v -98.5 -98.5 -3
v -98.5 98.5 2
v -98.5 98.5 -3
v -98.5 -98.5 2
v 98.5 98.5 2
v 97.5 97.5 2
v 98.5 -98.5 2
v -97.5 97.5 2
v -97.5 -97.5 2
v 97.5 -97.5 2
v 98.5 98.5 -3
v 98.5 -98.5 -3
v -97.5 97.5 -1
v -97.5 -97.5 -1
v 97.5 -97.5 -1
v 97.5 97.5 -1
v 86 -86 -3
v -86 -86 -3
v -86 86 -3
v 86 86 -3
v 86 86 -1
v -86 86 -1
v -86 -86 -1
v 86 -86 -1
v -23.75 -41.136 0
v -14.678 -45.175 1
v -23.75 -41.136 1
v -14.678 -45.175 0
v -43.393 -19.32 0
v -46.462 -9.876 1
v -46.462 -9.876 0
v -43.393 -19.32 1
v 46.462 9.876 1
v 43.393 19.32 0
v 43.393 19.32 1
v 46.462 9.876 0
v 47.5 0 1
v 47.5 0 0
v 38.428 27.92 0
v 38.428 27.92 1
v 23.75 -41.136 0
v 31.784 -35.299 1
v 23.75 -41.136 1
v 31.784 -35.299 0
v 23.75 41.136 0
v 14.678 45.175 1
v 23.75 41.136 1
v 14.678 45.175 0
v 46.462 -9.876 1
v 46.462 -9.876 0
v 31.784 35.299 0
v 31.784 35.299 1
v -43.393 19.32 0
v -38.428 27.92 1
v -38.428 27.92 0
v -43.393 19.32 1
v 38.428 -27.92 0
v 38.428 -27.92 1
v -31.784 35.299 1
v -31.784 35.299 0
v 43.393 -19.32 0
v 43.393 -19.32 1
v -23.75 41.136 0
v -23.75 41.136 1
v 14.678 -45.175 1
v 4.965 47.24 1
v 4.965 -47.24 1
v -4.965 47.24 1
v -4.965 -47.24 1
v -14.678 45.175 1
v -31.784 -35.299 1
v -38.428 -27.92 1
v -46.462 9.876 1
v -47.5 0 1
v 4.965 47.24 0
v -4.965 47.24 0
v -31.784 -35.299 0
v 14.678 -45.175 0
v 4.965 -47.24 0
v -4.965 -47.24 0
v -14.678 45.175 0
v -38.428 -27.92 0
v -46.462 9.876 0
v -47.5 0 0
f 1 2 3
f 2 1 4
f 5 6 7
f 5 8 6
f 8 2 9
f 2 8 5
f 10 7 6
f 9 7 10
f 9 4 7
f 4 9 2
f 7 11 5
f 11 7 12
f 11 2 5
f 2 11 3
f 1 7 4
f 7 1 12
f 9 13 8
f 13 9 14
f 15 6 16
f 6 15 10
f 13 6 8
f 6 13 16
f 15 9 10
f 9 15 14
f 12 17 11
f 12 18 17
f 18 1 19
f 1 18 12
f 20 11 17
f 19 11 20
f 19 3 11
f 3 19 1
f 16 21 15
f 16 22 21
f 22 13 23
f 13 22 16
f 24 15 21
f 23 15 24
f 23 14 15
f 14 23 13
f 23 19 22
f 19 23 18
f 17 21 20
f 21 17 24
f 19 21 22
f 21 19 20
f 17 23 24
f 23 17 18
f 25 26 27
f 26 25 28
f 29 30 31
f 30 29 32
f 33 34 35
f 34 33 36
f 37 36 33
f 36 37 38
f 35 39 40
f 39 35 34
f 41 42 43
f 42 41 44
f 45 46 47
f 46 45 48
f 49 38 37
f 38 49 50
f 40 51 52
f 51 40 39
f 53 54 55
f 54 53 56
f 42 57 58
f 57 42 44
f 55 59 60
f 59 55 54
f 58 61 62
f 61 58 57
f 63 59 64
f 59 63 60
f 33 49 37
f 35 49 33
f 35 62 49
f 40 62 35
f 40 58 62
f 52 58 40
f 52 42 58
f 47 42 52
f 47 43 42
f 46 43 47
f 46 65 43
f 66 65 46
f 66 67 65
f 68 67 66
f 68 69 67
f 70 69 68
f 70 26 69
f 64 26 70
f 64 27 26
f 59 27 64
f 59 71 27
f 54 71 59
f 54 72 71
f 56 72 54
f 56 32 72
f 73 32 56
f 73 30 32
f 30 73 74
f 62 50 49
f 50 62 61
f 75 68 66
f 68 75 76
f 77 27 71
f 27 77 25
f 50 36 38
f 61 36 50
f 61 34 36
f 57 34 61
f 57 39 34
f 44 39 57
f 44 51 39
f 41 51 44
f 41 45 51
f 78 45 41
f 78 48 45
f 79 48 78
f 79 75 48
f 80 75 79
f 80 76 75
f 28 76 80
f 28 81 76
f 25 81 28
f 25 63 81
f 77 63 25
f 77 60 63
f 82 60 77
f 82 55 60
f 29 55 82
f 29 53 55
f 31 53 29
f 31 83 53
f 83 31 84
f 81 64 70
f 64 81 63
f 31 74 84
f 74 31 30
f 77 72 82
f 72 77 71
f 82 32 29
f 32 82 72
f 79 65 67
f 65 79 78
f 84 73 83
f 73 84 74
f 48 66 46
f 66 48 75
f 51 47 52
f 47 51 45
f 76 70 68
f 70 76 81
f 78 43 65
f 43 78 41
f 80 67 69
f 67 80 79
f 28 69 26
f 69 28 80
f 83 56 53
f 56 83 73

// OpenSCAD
BoxTopLength=197;
BoxTopWidth=197;
LipHeight=4;
LipThickness=2;
LipOverHangWidth=25;
BoxTopThickness=2;
IsOpenTop=true;


//meshX=26;
meshY=18;
meshZ=40;
Seedrows=4;
Seedcolumns=4;

spokeCount=24;
spokerows=8;
spokeDia=15;
spokeY=2;
wallWidth=2;

//module lip(x,y,wall, height)
//{
//     translate([x/2,y/2,height/2]) difference()
//    {
//    cube([x,y,height],true);
//    cube([x-wall,y-wall,height+1], true);
//    }
//}

//module overlap(x,y,thickness, base)
module overlap(boxTopLength, boxTopWidth, boxTopThickness, lipHeight, lipThickness)
{
    echo(boxTop=4,boxTopLength=boxTopLength, boxTopWidth=boxTopWidth, boxTopThickness=boxTopThickness, lipHeight=lipHeight, lipThickness=lipThickness);
    
    height=boxTopThickness;
    
    echo(boxTopLength=boxTopLength, boxTopWidth=boxTopWidth, lipThickness=lipThickness, lipHeight=lipHeight);
    echo("pink", boxTopLength-lipHeight);
    
    //Box Top Lip
    difference()
    {
     color("red")  cube([boxTopLength,boxTopWidth,lipHeight],true);
     color("pink") cube([boxTopLength-lipThickness,boxTopWidth-lipThickness,lipHeight+2],true);   
    }
    
    //Lid portion of box top.
        translate([0,0,lipHeight/2]) color("blue") cube([boxTopLength,boxTopWidth,boxTopThickness],true);

//    //translate([0,0,lipHeight]) difference()
//    {
//    color("blue") cube([boxTopLength,boxTopWidth,boxTopThickness],true);
//    //color("lightblue") cube([boxTopLength-lipThickness,boxTopWidth-lipThickness,boxTopThickness+1], true);
//    }
}

//module reservoir(x,y,wall, height)
//{
//    //resize([0,0,0]) 
//    translate([x/2,y/2,0]) 
//    cube([x,y,wall],true);
//    difference()
//    {
//    lip(x,y,wall,height);
//    color("blue") translate([-5,y/2,height-(meshZ/2)])
//    rotate(a=180, v=[1,0,1]) cylinder(20,5,5, false);
//    }
//    
//}


module BoxTop(boxTopLength, boxTopWidth, boxTopThickness, lipHeight, lipThickness, isOpenTop, lipOverHangWidth)
{
    echo(boxTop=3,boxTopLength=boxTopLength, boxTopWidth=boxTopWidth, boxTopThickness=boxTopThickness, lipHeight=lipHeight, lipThickness=lipThickness, isOpenTop=isOpenTop, lipOverHangWidth=lipOverHangWidth);
    
        if(isOpenTop)
        {
            rotate([0,180,0]) difference()
            {
                //module overlap(boxTopLength, boxTopWidth, boxTopThickness, lipHeight, lipThickness)
                overlap(boxTopLength, boxTopWidth, boxTopThickness, lipHeight, lipThickness);
                translate(0,0,-2) cube([boxTopLength-lipOverHangWidth,boxTopWidth-lipOverHangWidth,lipHeight+7],true);
            }            
            translate(0,0,-4) color("pink") cylinder(h=lipHeight+7, r= 47.5,true);
        }
        else
        {
            overlap(boxTopLength, boxTopWidth, boxTopThickness, lipHeight, lipThickness);
        }
}

echo(BoxTopLength=BoxTopLength, BoxTopWidth=BoxTopWidth, BoxTopThickness=BoxTopThickness, LipHeight=LipHeight, LipThickness=LipThickness, IsOpenTop=IsOpenTop, LipOverHangWidth=LipOverHangWidth);
BoxTop(BoxTopLength, BoxTopWidth, BoxTopThickness, LipHeight, LipThickness, IsOpenTop, LipOverHangWidth);
